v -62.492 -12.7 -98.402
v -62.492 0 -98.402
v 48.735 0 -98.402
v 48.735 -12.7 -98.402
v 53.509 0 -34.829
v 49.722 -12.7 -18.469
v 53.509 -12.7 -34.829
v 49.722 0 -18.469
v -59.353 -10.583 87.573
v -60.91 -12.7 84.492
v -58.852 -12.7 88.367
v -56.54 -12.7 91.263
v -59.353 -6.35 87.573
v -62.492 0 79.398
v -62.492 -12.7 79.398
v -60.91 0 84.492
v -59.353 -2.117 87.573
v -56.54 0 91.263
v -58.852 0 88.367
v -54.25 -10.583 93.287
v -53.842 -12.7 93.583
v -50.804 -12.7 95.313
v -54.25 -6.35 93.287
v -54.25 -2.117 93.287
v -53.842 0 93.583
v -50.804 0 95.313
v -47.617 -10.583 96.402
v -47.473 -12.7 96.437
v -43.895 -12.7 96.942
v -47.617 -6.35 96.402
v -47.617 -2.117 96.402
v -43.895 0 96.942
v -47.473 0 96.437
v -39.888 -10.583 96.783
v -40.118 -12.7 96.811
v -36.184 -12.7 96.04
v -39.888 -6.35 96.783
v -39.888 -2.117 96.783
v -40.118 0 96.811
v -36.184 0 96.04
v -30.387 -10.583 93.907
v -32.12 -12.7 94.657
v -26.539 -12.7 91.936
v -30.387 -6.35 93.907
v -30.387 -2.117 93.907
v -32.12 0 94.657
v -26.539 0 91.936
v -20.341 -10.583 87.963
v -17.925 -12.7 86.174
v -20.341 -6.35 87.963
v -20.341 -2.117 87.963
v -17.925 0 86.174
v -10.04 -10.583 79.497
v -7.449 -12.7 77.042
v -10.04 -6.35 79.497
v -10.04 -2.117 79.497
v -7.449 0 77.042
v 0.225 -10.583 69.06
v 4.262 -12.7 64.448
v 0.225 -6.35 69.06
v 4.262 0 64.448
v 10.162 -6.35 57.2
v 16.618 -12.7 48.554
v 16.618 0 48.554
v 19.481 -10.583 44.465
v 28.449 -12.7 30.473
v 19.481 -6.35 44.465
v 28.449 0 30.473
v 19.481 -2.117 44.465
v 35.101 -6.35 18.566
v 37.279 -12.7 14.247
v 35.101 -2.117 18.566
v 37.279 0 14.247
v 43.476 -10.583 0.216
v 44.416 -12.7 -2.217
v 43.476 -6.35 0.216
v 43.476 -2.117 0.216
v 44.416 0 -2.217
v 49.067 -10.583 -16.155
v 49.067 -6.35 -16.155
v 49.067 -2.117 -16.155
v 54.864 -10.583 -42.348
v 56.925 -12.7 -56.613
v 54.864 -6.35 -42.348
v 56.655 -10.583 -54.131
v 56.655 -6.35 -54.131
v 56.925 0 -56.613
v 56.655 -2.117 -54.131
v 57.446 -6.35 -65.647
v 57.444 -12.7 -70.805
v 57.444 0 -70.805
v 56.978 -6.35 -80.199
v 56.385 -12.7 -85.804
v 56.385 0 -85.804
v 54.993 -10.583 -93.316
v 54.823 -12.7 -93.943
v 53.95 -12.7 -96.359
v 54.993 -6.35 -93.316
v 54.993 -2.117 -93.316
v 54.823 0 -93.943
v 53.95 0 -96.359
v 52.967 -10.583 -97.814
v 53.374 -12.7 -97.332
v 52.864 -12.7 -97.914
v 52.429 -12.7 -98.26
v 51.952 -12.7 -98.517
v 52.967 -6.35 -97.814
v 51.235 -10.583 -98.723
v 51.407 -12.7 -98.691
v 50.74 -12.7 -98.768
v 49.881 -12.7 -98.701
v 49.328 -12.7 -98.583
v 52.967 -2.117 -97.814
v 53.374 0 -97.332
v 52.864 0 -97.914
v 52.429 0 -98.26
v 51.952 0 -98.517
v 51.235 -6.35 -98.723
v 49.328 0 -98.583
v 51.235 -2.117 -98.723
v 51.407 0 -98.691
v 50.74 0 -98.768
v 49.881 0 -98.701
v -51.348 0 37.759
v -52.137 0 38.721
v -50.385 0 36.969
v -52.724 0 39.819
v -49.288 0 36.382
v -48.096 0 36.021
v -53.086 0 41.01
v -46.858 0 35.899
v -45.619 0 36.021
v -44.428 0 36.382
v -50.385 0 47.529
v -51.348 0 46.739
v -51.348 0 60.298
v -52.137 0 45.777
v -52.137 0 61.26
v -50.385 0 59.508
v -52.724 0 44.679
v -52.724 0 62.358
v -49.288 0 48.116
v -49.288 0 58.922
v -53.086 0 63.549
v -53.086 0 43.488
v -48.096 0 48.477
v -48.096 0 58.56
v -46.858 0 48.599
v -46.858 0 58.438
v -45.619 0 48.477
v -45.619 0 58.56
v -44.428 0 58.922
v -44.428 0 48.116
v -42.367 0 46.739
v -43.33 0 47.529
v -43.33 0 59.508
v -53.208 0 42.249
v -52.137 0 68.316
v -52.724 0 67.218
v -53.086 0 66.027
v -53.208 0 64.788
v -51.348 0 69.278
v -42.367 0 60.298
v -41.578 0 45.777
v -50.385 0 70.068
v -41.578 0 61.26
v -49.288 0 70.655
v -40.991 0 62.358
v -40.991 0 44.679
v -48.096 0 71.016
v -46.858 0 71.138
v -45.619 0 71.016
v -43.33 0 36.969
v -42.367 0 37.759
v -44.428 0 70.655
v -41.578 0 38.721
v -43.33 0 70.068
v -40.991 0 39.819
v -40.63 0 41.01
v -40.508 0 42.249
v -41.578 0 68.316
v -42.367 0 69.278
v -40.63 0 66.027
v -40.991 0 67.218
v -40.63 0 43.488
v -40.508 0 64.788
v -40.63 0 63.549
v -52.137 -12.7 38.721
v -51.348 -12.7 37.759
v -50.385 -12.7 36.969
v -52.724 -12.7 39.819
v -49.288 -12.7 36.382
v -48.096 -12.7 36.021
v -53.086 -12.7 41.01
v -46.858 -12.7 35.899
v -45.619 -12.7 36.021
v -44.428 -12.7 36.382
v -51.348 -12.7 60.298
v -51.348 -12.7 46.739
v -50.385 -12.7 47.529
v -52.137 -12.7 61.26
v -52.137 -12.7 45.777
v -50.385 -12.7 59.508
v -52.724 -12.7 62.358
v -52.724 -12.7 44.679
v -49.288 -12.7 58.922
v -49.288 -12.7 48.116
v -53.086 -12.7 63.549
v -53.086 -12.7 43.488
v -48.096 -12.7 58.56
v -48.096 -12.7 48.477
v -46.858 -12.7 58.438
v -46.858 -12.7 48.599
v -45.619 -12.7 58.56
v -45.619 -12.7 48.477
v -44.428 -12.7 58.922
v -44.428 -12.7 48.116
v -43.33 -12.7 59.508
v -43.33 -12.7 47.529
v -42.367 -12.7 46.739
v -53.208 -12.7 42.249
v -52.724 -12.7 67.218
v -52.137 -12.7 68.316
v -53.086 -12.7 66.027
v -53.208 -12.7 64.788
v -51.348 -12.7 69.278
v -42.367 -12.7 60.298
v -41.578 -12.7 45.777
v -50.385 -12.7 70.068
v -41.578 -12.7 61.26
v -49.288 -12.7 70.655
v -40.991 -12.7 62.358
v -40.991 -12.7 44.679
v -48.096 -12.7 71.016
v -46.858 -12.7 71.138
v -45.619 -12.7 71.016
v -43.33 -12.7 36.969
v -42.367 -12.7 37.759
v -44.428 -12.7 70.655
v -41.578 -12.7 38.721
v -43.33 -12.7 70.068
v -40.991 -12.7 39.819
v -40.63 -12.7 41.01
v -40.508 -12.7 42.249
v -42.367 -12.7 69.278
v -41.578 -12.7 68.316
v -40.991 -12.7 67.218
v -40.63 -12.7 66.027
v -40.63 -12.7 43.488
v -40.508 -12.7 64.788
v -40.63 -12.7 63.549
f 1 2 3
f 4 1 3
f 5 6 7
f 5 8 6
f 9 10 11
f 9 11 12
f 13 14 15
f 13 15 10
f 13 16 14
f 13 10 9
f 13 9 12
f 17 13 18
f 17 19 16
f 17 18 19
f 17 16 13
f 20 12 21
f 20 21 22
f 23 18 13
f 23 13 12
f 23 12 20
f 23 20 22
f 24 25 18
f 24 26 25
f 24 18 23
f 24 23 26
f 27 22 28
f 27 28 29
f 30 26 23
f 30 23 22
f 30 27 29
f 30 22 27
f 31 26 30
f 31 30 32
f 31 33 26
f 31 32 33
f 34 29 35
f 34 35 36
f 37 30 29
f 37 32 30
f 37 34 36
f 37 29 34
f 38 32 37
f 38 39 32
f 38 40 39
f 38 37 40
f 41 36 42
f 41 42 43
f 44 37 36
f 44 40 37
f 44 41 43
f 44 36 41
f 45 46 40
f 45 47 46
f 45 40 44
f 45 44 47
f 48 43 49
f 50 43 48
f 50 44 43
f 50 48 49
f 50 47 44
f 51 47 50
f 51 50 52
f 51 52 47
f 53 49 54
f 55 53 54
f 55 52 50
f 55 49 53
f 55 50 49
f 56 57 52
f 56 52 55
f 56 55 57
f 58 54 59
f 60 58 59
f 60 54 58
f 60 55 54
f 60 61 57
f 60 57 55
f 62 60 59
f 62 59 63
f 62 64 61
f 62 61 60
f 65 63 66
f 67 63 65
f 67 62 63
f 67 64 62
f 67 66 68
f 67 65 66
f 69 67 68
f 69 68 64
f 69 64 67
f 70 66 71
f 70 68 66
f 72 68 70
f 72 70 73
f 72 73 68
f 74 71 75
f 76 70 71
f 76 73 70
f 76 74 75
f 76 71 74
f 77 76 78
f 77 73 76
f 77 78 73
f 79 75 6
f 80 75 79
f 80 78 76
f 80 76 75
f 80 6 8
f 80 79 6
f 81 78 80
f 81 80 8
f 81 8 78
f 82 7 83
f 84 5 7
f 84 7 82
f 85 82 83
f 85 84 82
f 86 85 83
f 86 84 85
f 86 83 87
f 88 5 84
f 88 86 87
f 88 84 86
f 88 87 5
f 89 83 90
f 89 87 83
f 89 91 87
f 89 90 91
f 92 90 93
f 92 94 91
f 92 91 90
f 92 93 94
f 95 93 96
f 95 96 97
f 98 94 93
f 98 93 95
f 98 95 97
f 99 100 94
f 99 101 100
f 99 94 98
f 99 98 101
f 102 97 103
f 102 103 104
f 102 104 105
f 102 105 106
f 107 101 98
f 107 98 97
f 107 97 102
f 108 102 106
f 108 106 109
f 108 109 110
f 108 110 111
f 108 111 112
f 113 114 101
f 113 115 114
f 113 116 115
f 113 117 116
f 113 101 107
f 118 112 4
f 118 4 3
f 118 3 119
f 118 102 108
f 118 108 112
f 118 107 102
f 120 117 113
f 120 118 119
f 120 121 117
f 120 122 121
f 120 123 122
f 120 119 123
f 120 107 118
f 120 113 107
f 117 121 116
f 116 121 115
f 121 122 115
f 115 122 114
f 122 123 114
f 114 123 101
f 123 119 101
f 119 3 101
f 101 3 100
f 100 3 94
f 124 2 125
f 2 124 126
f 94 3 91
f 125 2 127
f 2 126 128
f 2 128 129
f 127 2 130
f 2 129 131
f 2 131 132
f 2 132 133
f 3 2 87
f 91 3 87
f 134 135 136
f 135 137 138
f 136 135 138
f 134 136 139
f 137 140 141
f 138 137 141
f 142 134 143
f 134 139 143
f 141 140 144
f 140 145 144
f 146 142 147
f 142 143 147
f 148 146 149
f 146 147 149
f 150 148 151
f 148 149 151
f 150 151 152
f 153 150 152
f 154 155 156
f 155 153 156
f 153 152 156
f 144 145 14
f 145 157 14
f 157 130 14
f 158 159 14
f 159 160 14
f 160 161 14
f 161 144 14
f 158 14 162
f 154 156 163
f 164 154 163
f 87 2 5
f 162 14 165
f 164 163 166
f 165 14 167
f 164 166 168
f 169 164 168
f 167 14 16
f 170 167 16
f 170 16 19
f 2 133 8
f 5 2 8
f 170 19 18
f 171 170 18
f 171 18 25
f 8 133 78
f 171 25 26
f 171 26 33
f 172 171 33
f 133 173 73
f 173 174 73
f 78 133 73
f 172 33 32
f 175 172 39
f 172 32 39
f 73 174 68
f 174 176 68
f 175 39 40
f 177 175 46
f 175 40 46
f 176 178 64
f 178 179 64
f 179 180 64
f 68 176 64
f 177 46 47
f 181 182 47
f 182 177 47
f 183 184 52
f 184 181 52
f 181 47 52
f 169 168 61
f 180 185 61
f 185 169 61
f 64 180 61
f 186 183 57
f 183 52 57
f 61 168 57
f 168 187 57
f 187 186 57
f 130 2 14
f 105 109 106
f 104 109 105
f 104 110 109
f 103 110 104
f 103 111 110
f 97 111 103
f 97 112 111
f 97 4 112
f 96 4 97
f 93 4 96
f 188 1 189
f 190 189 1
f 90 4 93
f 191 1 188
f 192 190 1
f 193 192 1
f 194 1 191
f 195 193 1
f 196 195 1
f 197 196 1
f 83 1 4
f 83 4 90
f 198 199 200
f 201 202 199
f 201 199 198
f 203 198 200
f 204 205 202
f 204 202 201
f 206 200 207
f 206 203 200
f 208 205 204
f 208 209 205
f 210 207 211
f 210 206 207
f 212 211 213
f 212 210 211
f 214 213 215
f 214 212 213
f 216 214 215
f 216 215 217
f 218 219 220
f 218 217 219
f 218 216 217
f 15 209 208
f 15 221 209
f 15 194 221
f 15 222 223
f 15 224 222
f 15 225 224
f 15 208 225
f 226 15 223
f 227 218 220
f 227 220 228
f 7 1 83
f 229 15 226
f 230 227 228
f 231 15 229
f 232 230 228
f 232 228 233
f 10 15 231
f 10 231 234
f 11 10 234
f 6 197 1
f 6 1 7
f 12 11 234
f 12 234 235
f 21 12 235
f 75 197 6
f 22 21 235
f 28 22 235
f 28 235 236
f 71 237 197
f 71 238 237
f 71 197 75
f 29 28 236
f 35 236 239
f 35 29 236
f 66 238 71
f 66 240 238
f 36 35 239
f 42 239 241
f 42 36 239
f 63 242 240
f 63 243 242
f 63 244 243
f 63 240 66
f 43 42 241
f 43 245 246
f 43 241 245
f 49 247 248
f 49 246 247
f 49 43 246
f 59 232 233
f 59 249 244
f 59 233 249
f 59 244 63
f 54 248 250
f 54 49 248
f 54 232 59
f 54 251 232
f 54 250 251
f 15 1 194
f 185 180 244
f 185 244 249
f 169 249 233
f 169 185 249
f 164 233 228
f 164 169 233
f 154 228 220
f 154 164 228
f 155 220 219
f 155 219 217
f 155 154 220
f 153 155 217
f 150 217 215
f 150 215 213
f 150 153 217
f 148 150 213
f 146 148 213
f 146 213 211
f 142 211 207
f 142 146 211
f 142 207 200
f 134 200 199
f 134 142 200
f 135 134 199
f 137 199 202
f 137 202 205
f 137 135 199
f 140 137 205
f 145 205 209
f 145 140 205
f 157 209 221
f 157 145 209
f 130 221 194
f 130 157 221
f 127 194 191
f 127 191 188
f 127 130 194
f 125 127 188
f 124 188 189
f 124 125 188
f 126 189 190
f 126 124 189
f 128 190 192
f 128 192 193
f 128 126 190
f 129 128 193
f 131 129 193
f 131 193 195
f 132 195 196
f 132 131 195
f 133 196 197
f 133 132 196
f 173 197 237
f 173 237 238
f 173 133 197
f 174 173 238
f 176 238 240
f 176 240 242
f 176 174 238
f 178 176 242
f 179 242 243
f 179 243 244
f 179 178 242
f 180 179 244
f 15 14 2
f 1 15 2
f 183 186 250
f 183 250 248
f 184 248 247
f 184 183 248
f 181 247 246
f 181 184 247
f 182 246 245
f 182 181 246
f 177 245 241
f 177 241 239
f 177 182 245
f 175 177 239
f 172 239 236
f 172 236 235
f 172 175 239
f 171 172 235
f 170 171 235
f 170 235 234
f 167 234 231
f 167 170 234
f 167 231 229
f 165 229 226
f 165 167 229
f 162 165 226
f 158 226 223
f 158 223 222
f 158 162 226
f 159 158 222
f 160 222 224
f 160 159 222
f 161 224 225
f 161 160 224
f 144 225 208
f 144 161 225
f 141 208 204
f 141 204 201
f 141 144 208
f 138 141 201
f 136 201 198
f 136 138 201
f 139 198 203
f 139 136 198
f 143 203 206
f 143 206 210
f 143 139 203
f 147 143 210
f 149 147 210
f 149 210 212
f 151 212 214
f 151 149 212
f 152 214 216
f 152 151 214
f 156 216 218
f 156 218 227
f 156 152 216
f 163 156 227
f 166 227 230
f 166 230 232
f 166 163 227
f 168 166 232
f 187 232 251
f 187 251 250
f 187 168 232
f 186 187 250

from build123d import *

# Parameters (mm, degrees)
F0_R     = 6.35
F1_DEPTH = 12.7


with BuildPart() as f1:
    # F0 (on Front) → F1 (new body)
    with BuildSketch(Plane.XZ):
        with BuildLine():
            Line((-62.4917310791, 62.3387722267), (-62.4917310791, -98.4021690574))
            Line((-62.4917310791, -98.4021690574), (48.7352559237, -98.4021690574))
            add(Edge.make_bspline(
                [(48.7352559237, -98.4021690574), (29.3297900082, -91.6985332362), (-53.7117630872, 10.9735691095), (-62.4917310791, 62.3387722267)],
                knots=[0.7299039405, 0.7299039405, 0.7299039405, 0.7299039405, 1, 1, 1, 1], degree=3))
        make_face()
        with BuildLine():
            add(Edge.make_bspline(
                [(48.7352559237, -98.4021690574), (29.3297900082, -91.6985332362), (-53.7117630872, 10.9735691095), (-62.4917310791, 62.3387722267)],
                knots=[0.7299039405, 0.7299039405, 0.7299039405, 0.7299039405, 1, 1, 1, 1], degree=3))
            add(Edge.make_bspline(
                [(-62.4917310791, 79.3978309426), (-59.8076427315, 91.8791864682), (-30.3583811457, 112.2582538654), (43.3116486469, 19.975292811), (54.796151396, -40.6196685771), (58.3164600027, -64.1777234903), (56.4358345174, -92.3455133169), (52.6766606255, -99.7637308905), (48.7352559237, -98.4021690574)],
                knots=[0.03442933, 0.03442933, 0.03442933, 0.03442933, 0.1239997664, 0.3250967159, 0.4796932186, 0.573227326, 0.6750452793, 0.7299039405, 0.7299039405, 0.7299039405, 0.7299039405], degree=3))
            Line((-62.4917310791, 79.3978309426), (-62.4917310791, 62.3387722267))
        make_face()
        with Locations((-46.8575544655, 42.2490648925)):
            Circle(F0_R, mode=Mode.SUBTRACT)
        with Locations((-46.8575544655, 64.7881403565)):
            Circle(F0_R, mode=Mode.SUBTRACT)
    extrude(amount=F1_DEPTH)


solid = f1.part
